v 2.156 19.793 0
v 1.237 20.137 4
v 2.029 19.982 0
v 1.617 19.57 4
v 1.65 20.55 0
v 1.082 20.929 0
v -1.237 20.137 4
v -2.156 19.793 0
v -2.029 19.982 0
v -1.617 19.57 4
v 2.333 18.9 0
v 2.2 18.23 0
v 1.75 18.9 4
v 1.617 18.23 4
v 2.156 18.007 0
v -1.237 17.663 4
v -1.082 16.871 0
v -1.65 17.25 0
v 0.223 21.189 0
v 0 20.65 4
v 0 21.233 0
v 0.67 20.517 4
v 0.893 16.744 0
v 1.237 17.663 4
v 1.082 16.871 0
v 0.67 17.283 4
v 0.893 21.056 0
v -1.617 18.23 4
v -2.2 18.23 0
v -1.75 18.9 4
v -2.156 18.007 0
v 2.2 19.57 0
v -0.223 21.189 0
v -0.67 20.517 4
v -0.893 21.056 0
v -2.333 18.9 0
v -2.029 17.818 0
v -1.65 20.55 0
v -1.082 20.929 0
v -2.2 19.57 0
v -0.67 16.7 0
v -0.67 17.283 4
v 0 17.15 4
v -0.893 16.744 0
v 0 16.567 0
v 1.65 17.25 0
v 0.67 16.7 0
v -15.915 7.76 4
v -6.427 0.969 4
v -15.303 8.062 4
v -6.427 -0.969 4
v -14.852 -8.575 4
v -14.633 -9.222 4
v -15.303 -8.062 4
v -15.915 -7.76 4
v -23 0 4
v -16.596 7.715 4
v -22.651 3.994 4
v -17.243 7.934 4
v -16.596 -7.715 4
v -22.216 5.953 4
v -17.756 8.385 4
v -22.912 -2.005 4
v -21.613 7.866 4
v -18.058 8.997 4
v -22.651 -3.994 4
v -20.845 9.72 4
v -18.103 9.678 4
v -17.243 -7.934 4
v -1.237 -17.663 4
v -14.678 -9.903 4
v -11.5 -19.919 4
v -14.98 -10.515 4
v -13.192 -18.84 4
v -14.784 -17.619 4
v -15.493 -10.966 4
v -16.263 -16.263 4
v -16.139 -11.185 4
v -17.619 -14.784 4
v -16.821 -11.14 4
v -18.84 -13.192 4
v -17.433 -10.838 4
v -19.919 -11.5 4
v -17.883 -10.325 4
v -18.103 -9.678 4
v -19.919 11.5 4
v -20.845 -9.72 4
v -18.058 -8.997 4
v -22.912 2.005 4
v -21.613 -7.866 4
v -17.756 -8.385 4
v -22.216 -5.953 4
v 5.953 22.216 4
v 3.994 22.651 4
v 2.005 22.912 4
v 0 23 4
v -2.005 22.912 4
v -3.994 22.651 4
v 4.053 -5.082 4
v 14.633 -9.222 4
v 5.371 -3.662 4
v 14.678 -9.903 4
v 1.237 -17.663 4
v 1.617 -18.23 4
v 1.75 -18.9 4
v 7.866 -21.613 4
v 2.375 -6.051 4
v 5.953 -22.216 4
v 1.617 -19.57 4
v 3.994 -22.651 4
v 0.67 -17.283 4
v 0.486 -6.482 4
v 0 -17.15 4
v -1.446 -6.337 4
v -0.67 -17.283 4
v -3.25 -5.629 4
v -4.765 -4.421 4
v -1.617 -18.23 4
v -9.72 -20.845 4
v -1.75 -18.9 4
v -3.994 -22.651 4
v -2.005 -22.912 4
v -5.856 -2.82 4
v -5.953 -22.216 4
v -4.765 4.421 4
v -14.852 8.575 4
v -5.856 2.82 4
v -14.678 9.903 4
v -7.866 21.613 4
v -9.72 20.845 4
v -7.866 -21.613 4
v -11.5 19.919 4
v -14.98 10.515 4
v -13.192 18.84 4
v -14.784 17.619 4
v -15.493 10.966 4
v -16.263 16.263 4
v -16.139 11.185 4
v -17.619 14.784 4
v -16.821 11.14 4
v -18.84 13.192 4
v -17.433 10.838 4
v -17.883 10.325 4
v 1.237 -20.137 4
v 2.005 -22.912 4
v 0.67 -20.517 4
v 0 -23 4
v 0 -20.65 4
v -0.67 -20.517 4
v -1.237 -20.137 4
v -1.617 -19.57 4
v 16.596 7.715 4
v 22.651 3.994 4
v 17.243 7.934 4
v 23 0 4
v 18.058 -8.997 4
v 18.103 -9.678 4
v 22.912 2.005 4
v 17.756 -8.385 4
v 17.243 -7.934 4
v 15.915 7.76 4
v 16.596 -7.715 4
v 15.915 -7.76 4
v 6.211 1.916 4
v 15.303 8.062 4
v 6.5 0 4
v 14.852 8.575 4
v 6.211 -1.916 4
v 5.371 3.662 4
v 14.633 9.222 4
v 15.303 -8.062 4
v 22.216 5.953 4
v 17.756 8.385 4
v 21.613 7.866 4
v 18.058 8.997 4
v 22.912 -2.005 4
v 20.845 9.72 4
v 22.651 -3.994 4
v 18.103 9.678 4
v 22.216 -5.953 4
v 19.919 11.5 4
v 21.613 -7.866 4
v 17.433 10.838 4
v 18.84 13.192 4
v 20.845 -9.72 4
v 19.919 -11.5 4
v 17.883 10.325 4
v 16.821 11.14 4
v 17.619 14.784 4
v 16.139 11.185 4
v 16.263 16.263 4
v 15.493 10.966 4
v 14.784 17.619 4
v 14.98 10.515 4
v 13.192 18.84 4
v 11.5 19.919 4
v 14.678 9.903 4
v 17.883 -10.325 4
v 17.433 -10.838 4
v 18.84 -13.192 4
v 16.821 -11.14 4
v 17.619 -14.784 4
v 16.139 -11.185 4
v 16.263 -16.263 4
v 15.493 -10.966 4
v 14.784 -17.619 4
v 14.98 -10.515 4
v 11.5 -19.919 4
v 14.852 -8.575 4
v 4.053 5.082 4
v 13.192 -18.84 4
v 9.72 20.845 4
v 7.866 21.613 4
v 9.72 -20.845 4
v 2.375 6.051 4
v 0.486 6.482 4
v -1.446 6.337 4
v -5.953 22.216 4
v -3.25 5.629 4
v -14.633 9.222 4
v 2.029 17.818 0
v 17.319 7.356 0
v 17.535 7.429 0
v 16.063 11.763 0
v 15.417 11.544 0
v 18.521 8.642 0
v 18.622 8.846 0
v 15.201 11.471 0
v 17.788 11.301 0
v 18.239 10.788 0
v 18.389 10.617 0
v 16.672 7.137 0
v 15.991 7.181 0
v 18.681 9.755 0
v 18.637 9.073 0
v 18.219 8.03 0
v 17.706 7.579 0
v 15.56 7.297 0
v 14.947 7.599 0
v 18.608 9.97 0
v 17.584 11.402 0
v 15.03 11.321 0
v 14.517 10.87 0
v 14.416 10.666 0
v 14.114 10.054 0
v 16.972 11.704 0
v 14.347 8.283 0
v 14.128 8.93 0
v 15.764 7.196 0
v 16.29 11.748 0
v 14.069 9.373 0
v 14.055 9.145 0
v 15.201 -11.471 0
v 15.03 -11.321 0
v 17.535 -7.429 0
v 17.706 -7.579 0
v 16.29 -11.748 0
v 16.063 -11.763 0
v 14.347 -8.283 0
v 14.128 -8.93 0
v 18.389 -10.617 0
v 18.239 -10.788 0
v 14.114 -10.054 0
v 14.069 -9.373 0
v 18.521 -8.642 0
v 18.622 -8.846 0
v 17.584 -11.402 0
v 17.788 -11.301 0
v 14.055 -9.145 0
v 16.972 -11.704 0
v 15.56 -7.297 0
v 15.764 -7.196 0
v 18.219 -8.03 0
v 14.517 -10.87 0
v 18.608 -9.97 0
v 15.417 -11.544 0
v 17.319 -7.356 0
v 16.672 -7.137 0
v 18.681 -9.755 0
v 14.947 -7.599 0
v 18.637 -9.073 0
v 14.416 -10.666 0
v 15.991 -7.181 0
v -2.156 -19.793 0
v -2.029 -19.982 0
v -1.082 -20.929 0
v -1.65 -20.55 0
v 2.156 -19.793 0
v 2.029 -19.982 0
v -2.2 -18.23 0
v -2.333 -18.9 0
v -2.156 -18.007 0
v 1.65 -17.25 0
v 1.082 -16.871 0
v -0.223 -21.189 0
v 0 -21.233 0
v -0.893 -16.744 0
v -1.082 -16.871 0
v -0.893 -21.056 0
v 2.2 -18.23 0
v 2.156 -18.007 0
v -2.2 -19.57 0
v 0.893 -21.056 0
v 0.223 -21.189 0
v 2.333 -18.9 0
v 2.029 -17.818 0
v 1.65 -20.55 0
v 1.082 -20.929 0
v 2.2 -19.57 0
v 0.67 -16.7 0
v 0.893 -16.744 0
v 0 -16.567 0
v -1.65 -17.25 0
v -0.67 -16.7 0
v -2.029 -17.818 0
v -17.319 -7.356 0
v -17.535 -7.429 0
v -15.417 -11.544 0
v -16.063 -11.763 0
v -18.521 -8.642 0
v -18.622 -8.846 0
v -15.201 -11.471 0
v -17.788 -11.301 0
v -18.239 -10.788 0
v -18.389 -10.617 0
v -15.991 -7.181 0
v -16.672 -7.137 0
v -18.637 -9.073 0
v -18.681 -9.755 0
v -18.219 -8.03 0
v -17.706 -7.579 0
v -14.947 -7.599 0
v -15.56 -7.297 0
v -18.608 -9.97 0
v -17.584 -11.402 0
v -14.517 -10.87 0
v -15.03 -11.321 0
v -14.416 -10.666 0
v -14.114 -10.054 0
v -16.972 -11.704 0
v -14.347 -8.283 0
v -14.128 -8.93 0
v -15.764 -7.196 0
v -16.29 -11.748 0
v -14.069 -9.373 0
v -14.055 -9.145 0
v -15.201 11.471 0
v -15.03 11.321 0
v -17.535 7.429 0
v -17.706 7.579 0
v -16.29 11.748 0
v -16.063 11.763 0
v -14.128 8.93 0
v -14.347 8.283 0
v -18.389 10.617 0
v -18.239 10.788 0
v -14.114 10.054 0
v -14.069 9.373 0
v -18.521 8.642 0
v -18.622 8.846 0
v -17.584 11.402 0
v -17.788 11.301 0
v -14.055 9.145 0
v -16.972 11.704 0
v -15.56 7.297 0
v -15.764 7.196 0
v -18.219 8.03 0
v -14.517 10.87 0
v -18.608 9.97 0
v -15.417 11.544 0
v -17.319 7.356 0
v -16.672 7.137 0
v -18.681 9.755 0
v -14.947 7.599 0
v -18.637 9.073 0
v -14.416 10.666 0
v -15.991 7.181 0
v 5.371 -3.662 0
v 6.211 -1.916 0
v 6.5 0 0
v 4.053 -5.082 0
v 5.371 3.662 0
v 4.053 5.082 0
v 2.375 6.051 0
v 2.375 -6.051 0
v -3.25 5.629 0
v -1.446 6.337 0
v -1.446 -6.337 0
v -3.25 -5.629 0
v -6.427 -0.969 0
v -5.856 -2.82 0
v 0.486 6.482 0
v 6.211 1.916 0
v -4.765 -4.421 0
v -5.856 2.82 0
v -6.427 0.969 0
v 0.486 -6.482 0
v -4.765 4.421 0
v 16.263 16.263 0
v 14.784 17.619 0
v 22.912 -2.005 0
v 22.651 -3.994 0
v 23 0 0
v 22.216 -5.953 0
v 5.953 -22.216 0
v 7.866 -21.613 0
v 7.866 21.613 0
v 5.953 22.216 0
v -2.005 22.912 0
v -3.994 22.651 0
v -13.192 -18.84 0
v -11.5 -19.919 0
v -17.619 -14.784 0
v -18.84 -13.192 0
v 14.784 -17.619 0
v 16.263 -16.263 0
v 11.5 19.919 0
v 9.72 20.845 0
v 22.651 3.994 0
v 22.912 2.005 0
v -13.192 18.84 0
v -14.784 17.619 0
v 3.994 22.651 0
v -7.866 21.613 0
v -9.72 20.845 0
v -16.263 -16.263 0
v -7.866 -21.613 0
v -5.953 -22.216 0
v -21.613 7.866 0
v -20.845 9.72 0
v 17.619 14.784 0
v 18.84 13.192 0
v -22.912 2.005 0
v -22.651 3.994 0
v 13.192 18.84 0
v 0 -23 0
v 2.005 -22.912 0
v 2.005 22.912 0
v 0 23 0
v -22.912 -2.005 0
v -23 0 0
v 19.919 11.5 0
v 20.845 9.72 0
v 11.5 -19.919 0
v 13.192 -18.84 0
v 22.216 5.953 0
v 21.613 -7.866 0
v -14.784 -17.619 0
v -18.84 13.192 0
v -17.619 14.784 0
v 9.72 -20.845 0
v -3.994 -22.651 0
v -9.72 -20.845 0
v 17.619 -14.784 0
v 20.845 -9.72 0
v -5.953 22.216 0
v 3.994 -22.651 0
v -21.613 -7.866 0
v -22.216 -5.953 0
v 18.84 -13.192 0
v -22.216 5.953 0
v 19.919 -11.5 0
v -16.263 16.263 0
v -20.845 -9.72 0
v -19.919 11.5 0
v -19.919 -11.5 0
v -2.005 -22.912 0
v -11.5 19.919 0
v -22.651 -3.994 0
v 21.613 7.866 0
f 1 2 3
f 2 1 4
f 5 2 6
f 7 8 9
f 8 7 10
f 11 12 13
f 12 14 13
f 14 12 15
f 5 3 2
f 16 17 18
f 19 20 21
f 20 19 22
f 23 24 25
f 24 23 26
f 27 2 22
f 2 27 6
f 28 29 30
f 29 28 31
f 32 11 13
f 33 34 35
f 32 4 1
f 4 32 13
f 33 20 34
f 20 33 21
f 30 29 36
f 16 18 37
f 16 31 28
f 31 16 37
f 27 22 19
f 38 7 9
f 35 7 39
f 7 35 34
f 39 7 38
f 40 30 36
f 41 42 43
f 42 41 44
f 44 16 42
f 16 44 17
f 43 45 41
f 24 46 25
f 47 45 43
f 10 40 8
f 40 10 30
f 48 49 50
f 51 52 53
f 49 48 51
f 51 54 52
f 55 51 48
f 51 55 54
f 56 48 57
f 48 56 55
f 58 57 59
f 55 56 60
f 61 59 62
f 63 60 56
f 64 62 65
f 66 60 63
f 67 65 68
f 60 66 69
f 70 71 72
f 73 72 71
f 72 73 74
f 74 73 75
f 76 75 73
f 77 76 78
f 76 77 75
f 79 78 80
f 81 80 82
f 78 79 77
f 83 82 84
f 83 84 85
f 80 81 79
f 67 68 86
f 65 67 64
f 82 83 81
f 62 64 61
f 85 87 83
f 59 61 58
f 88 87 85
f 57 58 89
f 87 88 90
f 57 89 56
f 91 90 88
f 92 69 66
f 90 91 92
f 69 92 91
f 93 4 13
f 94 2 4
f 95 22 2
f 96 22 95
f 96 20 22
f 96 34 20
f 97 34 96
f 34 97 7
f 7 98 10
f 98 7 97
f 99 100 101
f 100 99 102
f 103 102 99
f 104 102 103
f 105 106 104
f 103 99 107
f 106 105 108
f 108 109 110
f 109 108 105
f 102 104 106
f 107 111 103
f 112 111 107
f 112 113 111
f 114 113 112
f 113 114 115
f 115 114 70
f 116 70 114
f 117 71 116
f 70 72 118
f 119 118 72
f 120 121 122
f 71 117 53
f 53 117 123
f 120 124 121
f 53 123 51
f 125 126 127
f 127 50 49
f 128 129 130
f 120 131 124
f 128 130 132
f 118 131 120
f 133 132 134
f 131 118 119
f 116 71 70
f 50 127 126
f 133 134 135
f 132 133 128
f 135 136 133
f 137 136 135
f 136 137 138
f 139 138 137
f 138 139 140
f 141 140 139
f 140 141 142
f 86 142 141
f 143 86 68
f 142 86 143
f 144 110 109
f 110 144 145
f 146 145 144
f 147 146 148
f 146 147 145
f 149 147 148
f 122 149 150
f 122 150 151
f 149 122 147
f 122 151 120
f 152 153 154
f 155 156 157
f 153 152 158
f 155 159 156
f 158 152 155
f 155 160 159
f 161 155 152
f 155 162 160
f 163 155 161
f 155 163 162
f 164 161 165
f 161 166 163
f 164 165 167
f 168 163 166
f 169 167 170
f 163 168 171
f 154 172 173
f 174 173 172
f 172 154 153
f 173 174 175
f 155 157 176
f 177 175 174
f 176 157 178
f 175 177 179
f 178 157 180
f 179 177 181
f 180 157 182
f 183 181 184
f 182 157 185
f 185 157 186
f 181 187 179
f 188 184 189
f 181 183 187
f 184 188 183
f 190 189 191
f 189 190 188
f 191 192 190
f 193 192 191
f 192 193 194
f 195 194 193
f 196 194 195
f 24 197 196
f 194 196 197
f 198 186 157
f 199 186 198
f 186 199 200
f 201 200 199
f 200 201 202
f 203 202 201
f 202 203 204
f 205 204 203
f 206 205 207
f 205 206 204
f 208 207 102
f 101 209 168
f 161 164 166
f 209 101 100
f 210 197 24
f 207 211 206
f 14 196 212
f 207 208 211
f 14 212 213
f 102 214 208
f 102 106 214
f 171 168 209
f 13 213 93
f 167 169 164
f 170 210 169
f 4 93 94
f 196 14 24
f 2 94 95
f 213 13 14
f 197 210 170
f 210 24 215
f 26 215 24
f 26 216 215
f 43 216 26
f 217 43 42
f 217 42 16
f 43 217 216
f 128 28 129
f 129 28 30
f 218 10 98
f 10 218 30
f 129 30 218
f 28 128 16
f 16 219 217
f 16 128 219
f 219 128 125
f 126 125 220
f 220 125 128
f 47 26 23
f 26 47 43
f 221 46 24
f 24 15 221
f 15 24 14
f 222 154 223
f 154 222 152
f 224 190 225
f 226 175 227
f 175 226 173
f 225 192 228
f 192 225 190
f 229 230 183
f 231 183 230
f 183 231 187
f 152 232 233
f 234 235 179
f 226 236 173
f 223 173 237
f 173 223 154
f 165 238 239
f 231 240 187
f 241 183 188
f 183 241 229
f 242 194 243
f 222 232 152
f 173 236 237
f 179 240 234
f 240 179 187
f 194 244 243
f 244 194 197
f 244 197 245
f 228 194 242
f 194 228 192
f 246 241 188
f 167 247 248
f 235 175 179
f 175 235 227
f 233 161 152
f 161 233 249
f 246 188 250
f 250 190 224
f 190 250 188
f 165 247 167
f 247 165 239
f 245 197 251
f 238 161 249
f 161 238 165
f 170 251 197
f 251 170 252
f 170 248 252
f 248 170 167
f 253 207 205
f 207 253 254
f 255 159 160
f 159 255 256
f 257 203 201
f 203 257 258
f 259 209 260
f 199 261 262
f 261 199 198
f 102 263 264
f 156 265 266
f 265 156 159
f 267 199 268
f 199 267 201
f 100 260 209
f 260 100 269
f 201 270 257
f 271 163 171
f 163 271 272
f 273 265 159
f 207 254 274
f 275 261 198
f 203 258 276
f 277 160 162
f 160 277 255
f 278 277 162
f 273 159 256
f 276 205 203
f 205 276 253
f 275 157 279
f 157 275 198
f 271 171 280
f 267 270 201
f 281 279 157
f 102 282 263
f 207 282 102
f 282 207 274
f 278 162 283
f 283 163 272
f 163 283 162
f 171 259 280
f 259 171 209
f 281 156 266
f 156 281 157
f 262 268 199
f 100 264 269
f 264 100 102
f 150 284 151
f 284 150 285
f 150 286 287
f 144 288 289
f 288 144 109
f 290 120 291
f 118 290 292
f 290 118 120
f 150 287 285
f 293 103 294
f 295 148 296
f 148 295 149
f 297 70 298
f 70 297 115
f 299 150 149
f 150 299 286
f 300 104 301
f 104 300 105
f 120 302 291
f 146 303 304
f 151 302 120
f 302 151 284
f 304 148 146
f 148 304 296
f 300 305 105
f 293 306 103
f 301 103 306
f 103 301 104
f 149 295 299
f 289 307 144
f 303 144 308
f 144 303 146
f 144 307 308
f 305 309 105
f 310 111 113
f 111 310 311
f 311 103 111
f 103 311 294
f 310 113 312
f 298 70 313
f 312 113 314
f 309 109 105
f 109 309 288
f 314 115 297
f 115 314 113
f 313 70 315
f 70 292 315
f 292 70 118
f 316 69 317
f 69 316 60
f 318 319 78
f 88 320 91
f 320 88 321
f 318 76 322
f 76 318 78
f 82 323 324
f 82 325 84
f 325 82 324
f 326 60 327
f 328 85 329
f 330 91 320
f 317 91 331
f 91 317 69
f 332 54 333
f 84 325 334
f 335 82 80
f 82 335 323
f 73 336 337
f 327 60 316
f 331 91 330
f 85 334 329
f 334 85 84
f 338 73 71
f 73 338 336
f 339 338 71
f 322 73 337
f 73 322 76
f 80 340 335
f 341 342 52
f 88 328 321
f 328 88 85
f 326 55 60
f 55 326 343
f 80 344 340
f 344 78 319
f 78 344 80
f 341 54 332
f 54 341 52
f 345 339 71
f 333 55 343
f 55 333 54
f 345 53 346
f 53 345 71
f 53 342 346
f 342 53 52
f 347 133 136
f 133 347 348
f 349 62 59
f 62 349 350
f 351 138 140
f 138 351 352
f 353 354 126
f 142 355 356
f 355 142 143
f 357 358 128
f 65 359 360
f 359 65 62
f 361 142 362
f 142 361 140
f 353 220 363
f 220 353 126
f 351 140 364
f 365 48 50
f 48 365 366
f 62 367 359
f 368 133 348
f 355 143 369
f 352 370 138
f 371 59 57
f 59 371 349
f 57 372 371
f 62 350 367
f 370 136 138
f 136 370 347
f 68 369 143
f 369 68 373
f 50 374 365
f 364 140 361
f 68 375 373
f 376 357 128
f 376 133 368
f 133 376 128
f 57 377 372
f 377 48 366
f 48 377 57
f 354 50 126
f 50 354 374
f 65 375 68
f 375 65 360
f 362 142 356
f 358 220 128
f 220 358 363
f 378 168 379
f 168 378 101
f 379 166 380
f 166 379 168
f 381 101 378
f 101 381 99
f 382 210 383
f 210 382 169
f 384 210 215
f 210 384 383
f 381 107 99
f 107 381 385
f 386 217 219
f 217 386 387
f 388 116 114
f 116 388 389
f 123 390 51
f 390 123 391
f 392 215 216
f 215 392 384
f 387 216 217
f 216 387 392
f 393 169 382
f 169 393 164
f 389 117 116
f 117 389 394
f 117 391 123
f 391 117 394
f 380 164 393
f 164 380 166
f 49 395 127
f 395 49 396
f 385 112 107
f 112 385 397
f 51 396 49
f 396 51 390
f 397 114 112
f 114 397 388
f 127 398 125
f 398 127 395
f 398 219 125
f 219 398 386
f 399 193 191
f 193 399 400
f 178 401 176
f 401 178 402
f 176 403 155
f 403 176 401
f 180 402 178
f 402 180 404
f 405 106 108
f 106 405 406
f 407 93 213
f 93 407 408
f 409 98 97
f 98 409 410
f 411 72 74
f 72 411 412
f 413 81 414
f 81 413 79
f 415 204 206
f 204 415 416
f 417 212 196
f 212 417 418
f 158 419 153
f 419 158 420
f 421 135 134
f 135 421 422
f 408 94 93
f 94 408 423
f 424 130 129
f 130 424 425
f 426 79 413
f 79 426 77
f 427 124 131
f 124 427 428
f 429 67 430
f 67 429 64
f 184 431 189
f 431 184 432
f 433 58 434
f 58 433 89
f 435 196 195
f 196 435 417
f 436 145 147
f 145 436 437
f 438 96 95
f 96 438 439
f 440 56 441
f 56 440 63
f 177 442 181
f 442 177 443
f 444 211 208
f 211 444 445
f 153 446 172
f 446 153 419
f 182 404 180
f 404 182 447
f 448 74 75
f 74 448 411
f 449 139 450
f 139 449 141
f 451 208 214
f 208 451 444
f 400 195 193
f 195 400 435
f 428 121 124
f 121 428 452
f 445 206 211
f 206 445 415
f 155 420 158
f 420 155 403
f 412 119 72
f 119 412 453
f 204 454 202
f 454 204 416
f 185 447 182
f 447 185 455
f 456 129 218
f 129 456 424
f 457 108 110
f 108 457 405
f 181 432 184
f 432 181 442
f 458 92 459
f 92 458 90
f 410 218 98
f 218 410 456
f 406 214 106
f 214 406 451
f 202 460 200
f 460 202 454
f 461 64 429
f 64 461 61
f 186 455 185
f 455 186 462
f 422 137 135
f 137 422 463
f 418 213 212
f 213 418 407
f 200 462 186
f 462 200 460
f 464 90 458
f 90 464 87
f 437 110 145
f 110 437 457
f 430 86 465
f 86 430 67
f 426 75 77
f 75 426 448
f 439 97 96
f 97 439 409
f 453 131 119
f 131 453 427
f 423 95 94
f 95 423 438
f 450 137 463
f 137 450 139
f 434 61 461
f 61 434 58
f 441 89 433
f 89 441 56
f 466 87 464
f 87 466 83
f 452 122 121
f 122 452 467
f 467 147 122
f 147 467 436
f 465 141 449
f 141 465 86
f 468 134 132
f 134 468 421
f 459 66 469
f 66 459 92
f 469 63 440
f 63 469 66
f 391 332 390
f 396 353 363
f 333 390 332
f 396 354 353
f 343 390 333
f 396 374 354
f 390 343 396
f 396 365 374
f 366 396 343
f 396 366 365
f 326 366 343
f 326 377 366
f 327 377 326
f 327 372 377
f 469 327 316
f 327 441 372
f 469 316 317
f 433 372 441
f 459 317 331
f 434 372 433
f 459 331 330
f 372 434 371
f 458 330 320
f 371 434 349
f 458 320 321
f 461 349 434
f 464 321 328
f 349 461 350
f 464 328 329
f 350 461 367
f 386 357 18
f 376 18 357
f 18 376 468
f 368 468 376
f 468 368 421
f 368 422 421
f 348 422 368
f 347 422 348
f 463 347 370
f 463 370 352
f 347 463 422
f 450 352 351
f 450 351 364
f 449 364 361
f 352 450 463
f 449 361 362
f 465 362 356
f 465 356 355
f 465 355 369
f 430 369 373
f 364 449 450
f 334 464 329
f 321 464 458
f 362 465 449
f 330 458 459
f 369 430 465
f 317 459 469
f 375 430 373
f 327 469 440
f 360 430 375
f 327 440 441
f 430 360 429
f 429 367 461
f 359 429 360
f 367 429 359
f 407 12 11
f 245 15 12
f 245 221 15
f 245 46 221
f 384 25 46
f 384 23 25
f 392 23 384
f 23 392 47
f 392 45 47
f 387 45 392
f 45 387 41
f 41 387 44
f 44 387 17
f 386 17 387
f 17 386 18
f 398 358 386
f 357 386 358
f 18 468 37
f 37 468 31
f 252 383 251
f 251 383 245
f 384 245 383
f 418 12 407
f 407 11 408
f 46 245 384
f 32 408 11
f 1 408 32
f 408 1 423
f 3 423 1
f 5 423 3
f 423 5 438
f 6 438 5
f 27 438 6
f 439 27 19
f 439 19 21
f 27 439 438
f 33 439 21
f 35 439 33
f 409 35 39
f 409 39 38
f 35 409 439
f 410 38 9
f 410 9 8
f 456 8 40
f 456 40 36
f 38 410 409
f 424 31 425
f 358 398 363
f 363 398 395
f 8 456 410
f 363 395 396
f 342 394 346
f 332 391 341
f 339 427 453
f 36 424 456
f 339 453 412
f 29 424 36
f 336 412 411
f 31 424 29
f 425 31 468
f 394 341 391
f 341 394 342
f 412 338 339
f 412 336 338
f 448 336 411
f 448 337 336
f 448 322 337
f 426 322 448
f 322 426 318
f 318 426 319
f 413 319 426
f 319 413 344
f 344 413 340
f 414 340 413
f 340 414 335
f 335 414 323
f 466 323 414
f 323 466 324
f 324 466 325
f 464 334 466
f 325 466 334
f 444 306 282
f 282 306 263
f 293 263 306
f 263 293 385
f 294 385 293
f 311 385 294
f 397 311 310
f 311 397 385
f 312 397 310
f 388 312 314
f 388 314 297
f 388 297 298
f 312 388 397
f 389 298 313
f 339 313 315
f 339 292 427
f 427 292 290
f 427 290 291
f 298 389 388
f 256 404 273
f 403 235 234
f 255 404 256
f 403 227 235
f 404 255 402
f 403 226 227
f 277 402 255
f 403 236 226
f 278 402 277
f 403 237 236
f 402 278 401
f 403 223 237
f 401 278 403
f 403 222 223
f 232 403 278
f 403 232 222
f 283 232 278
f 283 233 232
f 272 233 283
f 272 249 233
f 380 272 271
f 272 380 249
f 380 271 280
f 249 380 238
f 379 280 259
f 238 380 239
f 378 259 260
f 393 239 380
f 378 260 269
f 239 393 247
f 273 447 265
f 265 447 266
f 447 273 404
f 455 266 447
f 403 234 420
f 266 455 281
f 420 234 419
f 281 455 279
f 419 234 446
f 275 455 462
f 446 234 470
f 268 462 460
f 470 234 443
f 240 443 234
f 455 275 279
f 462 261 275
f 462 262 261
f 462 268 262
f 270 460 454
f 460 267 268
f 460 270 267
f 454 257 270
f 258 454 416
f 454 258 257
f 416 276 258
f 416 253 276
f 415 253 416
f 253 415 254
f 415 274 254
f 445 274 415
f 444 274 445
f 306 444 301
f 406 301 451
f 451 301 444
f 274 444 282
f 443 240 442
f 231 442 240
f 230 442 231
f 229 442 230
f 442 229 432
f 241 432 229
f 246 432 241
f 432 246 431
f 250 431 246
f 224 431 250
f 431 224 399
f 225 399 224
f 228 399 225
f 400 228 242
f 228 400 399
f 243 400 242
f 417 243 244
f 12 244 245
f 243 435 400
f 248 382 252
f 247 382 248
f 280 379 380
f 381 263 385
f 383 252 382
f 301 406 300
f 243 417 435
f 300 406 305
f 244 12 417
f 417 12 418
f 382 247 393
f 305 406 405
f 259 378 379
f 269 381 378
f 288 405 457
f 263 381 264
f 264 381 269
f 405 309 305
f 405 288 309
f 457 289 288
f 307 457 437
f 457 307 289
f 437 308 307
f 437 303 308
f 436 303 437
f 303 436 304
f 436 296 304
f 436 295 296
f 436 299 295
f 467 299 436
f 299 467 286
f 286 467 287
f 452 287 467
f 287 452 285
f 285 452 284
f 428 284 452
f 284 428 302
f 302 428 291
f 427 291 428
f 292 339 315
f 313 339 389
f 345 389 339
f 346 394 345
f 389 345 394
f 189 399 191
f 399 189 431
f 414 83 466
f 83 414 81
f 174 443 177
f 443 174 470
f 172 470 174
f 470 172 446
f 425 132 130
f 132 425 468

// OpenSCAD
M3HoleDiameter = 3.5;
M3NutDiameter = 6.8;
M3BoltDiameter = 6.5;
height = 4;

module HotEndMount(flipped=true, part) {

	module E3Dv5() {
		cylinder(h=height+1,d=13);
	}

	module screwhole(withNut=true, d = M3HoleDiameter) {
		cylinder(h = height+2, d = d, $fn = 16);
		if(withNut)rotate([0, 0, 30]) cylinder(h = 3, d = M3NutDiameter, center = true, $fn = 6);
	}

	module OuterShape() {
		union () {
			cylinder(h = height, r = 23,$fn=72);
		}
	}

	module InnerShape() {
/*		for(side = [1, -1])
		{
			translate([0,9*side,height/2+0.7])rotate([0,90,0]){
				cylinder(h=60,d=M3HoleDiameter,center=true,$fn=32);
				translate([0,0,6])rotate([0,0,30])cylinder(h=30,d=M3NutDiameter,center=false,$fn=6);
				rotate([0,180,0])translate([0,0,6])cylinder(h=30,d=M3NutDiameter,center=false,$fn=32);
			}
		}
*/
		for(ang = [0, 60, 120, 180, 240, 300]) rotate([0, 0, ang]) {
			translate([0, -18.9, 0]) {
				// bolt hole is tapered at the bottom
				// to avoid snagging on threads. Top (err, bottom?) part of
				// bolt should be smooth and not snag.
				cylinder(h = height+2, d1 = M3HoleDiameter, d2 = M3HoleDiameter*1.5, $fn = 16);
			}
		}

/*
		for(ang = [210, 330, 450]) {
			rotate([0, 0, ang+10.5]) {
				translate([0, -18.9, 0]) {
					screwhole(withNut=false,d=M3HoleDiameter);
					translate([0,0,height-1+0.1])cylinder(h=1,d=M3BoltDiameter,$fn=32);
				}
			}
			rotate([0, 0, ang-10.5]) {
				translate([0, -18.9, 0]) {
					screwhole(withNut=false,d=M3HoleDiameter);
					translate([0,0,height-1+0.1])cylinder(h=1,d=M3BoltDiameter,$fn=32);
				}
			}
		}
*/

		E3Dv5();

/*
		if (part == 0) {
			translate([-0.1,-24,-0.5])cube([24,24*2,height+1]);
		} else if(part == 1) {
			translate([0.1-24,-24,-0.5])cube([24,24*2,height+1]);
		}
*/
		// Center hole
		//cylinder(h = height + 1, r = 15);
	}

	rotate([flipped?180:0, 0, 0]) translate([0, 0, flipped?-height:0])
	render()difference() {
		OuterShape();
		InnerShape();
	}
}


//translate([-3,0,0])rotate([0,0,0])HotEndMount(part=0);
//translate([3,0,0])rotate([0,0,0])HotEndMount(part=1);

HotEndMount(part=0);
